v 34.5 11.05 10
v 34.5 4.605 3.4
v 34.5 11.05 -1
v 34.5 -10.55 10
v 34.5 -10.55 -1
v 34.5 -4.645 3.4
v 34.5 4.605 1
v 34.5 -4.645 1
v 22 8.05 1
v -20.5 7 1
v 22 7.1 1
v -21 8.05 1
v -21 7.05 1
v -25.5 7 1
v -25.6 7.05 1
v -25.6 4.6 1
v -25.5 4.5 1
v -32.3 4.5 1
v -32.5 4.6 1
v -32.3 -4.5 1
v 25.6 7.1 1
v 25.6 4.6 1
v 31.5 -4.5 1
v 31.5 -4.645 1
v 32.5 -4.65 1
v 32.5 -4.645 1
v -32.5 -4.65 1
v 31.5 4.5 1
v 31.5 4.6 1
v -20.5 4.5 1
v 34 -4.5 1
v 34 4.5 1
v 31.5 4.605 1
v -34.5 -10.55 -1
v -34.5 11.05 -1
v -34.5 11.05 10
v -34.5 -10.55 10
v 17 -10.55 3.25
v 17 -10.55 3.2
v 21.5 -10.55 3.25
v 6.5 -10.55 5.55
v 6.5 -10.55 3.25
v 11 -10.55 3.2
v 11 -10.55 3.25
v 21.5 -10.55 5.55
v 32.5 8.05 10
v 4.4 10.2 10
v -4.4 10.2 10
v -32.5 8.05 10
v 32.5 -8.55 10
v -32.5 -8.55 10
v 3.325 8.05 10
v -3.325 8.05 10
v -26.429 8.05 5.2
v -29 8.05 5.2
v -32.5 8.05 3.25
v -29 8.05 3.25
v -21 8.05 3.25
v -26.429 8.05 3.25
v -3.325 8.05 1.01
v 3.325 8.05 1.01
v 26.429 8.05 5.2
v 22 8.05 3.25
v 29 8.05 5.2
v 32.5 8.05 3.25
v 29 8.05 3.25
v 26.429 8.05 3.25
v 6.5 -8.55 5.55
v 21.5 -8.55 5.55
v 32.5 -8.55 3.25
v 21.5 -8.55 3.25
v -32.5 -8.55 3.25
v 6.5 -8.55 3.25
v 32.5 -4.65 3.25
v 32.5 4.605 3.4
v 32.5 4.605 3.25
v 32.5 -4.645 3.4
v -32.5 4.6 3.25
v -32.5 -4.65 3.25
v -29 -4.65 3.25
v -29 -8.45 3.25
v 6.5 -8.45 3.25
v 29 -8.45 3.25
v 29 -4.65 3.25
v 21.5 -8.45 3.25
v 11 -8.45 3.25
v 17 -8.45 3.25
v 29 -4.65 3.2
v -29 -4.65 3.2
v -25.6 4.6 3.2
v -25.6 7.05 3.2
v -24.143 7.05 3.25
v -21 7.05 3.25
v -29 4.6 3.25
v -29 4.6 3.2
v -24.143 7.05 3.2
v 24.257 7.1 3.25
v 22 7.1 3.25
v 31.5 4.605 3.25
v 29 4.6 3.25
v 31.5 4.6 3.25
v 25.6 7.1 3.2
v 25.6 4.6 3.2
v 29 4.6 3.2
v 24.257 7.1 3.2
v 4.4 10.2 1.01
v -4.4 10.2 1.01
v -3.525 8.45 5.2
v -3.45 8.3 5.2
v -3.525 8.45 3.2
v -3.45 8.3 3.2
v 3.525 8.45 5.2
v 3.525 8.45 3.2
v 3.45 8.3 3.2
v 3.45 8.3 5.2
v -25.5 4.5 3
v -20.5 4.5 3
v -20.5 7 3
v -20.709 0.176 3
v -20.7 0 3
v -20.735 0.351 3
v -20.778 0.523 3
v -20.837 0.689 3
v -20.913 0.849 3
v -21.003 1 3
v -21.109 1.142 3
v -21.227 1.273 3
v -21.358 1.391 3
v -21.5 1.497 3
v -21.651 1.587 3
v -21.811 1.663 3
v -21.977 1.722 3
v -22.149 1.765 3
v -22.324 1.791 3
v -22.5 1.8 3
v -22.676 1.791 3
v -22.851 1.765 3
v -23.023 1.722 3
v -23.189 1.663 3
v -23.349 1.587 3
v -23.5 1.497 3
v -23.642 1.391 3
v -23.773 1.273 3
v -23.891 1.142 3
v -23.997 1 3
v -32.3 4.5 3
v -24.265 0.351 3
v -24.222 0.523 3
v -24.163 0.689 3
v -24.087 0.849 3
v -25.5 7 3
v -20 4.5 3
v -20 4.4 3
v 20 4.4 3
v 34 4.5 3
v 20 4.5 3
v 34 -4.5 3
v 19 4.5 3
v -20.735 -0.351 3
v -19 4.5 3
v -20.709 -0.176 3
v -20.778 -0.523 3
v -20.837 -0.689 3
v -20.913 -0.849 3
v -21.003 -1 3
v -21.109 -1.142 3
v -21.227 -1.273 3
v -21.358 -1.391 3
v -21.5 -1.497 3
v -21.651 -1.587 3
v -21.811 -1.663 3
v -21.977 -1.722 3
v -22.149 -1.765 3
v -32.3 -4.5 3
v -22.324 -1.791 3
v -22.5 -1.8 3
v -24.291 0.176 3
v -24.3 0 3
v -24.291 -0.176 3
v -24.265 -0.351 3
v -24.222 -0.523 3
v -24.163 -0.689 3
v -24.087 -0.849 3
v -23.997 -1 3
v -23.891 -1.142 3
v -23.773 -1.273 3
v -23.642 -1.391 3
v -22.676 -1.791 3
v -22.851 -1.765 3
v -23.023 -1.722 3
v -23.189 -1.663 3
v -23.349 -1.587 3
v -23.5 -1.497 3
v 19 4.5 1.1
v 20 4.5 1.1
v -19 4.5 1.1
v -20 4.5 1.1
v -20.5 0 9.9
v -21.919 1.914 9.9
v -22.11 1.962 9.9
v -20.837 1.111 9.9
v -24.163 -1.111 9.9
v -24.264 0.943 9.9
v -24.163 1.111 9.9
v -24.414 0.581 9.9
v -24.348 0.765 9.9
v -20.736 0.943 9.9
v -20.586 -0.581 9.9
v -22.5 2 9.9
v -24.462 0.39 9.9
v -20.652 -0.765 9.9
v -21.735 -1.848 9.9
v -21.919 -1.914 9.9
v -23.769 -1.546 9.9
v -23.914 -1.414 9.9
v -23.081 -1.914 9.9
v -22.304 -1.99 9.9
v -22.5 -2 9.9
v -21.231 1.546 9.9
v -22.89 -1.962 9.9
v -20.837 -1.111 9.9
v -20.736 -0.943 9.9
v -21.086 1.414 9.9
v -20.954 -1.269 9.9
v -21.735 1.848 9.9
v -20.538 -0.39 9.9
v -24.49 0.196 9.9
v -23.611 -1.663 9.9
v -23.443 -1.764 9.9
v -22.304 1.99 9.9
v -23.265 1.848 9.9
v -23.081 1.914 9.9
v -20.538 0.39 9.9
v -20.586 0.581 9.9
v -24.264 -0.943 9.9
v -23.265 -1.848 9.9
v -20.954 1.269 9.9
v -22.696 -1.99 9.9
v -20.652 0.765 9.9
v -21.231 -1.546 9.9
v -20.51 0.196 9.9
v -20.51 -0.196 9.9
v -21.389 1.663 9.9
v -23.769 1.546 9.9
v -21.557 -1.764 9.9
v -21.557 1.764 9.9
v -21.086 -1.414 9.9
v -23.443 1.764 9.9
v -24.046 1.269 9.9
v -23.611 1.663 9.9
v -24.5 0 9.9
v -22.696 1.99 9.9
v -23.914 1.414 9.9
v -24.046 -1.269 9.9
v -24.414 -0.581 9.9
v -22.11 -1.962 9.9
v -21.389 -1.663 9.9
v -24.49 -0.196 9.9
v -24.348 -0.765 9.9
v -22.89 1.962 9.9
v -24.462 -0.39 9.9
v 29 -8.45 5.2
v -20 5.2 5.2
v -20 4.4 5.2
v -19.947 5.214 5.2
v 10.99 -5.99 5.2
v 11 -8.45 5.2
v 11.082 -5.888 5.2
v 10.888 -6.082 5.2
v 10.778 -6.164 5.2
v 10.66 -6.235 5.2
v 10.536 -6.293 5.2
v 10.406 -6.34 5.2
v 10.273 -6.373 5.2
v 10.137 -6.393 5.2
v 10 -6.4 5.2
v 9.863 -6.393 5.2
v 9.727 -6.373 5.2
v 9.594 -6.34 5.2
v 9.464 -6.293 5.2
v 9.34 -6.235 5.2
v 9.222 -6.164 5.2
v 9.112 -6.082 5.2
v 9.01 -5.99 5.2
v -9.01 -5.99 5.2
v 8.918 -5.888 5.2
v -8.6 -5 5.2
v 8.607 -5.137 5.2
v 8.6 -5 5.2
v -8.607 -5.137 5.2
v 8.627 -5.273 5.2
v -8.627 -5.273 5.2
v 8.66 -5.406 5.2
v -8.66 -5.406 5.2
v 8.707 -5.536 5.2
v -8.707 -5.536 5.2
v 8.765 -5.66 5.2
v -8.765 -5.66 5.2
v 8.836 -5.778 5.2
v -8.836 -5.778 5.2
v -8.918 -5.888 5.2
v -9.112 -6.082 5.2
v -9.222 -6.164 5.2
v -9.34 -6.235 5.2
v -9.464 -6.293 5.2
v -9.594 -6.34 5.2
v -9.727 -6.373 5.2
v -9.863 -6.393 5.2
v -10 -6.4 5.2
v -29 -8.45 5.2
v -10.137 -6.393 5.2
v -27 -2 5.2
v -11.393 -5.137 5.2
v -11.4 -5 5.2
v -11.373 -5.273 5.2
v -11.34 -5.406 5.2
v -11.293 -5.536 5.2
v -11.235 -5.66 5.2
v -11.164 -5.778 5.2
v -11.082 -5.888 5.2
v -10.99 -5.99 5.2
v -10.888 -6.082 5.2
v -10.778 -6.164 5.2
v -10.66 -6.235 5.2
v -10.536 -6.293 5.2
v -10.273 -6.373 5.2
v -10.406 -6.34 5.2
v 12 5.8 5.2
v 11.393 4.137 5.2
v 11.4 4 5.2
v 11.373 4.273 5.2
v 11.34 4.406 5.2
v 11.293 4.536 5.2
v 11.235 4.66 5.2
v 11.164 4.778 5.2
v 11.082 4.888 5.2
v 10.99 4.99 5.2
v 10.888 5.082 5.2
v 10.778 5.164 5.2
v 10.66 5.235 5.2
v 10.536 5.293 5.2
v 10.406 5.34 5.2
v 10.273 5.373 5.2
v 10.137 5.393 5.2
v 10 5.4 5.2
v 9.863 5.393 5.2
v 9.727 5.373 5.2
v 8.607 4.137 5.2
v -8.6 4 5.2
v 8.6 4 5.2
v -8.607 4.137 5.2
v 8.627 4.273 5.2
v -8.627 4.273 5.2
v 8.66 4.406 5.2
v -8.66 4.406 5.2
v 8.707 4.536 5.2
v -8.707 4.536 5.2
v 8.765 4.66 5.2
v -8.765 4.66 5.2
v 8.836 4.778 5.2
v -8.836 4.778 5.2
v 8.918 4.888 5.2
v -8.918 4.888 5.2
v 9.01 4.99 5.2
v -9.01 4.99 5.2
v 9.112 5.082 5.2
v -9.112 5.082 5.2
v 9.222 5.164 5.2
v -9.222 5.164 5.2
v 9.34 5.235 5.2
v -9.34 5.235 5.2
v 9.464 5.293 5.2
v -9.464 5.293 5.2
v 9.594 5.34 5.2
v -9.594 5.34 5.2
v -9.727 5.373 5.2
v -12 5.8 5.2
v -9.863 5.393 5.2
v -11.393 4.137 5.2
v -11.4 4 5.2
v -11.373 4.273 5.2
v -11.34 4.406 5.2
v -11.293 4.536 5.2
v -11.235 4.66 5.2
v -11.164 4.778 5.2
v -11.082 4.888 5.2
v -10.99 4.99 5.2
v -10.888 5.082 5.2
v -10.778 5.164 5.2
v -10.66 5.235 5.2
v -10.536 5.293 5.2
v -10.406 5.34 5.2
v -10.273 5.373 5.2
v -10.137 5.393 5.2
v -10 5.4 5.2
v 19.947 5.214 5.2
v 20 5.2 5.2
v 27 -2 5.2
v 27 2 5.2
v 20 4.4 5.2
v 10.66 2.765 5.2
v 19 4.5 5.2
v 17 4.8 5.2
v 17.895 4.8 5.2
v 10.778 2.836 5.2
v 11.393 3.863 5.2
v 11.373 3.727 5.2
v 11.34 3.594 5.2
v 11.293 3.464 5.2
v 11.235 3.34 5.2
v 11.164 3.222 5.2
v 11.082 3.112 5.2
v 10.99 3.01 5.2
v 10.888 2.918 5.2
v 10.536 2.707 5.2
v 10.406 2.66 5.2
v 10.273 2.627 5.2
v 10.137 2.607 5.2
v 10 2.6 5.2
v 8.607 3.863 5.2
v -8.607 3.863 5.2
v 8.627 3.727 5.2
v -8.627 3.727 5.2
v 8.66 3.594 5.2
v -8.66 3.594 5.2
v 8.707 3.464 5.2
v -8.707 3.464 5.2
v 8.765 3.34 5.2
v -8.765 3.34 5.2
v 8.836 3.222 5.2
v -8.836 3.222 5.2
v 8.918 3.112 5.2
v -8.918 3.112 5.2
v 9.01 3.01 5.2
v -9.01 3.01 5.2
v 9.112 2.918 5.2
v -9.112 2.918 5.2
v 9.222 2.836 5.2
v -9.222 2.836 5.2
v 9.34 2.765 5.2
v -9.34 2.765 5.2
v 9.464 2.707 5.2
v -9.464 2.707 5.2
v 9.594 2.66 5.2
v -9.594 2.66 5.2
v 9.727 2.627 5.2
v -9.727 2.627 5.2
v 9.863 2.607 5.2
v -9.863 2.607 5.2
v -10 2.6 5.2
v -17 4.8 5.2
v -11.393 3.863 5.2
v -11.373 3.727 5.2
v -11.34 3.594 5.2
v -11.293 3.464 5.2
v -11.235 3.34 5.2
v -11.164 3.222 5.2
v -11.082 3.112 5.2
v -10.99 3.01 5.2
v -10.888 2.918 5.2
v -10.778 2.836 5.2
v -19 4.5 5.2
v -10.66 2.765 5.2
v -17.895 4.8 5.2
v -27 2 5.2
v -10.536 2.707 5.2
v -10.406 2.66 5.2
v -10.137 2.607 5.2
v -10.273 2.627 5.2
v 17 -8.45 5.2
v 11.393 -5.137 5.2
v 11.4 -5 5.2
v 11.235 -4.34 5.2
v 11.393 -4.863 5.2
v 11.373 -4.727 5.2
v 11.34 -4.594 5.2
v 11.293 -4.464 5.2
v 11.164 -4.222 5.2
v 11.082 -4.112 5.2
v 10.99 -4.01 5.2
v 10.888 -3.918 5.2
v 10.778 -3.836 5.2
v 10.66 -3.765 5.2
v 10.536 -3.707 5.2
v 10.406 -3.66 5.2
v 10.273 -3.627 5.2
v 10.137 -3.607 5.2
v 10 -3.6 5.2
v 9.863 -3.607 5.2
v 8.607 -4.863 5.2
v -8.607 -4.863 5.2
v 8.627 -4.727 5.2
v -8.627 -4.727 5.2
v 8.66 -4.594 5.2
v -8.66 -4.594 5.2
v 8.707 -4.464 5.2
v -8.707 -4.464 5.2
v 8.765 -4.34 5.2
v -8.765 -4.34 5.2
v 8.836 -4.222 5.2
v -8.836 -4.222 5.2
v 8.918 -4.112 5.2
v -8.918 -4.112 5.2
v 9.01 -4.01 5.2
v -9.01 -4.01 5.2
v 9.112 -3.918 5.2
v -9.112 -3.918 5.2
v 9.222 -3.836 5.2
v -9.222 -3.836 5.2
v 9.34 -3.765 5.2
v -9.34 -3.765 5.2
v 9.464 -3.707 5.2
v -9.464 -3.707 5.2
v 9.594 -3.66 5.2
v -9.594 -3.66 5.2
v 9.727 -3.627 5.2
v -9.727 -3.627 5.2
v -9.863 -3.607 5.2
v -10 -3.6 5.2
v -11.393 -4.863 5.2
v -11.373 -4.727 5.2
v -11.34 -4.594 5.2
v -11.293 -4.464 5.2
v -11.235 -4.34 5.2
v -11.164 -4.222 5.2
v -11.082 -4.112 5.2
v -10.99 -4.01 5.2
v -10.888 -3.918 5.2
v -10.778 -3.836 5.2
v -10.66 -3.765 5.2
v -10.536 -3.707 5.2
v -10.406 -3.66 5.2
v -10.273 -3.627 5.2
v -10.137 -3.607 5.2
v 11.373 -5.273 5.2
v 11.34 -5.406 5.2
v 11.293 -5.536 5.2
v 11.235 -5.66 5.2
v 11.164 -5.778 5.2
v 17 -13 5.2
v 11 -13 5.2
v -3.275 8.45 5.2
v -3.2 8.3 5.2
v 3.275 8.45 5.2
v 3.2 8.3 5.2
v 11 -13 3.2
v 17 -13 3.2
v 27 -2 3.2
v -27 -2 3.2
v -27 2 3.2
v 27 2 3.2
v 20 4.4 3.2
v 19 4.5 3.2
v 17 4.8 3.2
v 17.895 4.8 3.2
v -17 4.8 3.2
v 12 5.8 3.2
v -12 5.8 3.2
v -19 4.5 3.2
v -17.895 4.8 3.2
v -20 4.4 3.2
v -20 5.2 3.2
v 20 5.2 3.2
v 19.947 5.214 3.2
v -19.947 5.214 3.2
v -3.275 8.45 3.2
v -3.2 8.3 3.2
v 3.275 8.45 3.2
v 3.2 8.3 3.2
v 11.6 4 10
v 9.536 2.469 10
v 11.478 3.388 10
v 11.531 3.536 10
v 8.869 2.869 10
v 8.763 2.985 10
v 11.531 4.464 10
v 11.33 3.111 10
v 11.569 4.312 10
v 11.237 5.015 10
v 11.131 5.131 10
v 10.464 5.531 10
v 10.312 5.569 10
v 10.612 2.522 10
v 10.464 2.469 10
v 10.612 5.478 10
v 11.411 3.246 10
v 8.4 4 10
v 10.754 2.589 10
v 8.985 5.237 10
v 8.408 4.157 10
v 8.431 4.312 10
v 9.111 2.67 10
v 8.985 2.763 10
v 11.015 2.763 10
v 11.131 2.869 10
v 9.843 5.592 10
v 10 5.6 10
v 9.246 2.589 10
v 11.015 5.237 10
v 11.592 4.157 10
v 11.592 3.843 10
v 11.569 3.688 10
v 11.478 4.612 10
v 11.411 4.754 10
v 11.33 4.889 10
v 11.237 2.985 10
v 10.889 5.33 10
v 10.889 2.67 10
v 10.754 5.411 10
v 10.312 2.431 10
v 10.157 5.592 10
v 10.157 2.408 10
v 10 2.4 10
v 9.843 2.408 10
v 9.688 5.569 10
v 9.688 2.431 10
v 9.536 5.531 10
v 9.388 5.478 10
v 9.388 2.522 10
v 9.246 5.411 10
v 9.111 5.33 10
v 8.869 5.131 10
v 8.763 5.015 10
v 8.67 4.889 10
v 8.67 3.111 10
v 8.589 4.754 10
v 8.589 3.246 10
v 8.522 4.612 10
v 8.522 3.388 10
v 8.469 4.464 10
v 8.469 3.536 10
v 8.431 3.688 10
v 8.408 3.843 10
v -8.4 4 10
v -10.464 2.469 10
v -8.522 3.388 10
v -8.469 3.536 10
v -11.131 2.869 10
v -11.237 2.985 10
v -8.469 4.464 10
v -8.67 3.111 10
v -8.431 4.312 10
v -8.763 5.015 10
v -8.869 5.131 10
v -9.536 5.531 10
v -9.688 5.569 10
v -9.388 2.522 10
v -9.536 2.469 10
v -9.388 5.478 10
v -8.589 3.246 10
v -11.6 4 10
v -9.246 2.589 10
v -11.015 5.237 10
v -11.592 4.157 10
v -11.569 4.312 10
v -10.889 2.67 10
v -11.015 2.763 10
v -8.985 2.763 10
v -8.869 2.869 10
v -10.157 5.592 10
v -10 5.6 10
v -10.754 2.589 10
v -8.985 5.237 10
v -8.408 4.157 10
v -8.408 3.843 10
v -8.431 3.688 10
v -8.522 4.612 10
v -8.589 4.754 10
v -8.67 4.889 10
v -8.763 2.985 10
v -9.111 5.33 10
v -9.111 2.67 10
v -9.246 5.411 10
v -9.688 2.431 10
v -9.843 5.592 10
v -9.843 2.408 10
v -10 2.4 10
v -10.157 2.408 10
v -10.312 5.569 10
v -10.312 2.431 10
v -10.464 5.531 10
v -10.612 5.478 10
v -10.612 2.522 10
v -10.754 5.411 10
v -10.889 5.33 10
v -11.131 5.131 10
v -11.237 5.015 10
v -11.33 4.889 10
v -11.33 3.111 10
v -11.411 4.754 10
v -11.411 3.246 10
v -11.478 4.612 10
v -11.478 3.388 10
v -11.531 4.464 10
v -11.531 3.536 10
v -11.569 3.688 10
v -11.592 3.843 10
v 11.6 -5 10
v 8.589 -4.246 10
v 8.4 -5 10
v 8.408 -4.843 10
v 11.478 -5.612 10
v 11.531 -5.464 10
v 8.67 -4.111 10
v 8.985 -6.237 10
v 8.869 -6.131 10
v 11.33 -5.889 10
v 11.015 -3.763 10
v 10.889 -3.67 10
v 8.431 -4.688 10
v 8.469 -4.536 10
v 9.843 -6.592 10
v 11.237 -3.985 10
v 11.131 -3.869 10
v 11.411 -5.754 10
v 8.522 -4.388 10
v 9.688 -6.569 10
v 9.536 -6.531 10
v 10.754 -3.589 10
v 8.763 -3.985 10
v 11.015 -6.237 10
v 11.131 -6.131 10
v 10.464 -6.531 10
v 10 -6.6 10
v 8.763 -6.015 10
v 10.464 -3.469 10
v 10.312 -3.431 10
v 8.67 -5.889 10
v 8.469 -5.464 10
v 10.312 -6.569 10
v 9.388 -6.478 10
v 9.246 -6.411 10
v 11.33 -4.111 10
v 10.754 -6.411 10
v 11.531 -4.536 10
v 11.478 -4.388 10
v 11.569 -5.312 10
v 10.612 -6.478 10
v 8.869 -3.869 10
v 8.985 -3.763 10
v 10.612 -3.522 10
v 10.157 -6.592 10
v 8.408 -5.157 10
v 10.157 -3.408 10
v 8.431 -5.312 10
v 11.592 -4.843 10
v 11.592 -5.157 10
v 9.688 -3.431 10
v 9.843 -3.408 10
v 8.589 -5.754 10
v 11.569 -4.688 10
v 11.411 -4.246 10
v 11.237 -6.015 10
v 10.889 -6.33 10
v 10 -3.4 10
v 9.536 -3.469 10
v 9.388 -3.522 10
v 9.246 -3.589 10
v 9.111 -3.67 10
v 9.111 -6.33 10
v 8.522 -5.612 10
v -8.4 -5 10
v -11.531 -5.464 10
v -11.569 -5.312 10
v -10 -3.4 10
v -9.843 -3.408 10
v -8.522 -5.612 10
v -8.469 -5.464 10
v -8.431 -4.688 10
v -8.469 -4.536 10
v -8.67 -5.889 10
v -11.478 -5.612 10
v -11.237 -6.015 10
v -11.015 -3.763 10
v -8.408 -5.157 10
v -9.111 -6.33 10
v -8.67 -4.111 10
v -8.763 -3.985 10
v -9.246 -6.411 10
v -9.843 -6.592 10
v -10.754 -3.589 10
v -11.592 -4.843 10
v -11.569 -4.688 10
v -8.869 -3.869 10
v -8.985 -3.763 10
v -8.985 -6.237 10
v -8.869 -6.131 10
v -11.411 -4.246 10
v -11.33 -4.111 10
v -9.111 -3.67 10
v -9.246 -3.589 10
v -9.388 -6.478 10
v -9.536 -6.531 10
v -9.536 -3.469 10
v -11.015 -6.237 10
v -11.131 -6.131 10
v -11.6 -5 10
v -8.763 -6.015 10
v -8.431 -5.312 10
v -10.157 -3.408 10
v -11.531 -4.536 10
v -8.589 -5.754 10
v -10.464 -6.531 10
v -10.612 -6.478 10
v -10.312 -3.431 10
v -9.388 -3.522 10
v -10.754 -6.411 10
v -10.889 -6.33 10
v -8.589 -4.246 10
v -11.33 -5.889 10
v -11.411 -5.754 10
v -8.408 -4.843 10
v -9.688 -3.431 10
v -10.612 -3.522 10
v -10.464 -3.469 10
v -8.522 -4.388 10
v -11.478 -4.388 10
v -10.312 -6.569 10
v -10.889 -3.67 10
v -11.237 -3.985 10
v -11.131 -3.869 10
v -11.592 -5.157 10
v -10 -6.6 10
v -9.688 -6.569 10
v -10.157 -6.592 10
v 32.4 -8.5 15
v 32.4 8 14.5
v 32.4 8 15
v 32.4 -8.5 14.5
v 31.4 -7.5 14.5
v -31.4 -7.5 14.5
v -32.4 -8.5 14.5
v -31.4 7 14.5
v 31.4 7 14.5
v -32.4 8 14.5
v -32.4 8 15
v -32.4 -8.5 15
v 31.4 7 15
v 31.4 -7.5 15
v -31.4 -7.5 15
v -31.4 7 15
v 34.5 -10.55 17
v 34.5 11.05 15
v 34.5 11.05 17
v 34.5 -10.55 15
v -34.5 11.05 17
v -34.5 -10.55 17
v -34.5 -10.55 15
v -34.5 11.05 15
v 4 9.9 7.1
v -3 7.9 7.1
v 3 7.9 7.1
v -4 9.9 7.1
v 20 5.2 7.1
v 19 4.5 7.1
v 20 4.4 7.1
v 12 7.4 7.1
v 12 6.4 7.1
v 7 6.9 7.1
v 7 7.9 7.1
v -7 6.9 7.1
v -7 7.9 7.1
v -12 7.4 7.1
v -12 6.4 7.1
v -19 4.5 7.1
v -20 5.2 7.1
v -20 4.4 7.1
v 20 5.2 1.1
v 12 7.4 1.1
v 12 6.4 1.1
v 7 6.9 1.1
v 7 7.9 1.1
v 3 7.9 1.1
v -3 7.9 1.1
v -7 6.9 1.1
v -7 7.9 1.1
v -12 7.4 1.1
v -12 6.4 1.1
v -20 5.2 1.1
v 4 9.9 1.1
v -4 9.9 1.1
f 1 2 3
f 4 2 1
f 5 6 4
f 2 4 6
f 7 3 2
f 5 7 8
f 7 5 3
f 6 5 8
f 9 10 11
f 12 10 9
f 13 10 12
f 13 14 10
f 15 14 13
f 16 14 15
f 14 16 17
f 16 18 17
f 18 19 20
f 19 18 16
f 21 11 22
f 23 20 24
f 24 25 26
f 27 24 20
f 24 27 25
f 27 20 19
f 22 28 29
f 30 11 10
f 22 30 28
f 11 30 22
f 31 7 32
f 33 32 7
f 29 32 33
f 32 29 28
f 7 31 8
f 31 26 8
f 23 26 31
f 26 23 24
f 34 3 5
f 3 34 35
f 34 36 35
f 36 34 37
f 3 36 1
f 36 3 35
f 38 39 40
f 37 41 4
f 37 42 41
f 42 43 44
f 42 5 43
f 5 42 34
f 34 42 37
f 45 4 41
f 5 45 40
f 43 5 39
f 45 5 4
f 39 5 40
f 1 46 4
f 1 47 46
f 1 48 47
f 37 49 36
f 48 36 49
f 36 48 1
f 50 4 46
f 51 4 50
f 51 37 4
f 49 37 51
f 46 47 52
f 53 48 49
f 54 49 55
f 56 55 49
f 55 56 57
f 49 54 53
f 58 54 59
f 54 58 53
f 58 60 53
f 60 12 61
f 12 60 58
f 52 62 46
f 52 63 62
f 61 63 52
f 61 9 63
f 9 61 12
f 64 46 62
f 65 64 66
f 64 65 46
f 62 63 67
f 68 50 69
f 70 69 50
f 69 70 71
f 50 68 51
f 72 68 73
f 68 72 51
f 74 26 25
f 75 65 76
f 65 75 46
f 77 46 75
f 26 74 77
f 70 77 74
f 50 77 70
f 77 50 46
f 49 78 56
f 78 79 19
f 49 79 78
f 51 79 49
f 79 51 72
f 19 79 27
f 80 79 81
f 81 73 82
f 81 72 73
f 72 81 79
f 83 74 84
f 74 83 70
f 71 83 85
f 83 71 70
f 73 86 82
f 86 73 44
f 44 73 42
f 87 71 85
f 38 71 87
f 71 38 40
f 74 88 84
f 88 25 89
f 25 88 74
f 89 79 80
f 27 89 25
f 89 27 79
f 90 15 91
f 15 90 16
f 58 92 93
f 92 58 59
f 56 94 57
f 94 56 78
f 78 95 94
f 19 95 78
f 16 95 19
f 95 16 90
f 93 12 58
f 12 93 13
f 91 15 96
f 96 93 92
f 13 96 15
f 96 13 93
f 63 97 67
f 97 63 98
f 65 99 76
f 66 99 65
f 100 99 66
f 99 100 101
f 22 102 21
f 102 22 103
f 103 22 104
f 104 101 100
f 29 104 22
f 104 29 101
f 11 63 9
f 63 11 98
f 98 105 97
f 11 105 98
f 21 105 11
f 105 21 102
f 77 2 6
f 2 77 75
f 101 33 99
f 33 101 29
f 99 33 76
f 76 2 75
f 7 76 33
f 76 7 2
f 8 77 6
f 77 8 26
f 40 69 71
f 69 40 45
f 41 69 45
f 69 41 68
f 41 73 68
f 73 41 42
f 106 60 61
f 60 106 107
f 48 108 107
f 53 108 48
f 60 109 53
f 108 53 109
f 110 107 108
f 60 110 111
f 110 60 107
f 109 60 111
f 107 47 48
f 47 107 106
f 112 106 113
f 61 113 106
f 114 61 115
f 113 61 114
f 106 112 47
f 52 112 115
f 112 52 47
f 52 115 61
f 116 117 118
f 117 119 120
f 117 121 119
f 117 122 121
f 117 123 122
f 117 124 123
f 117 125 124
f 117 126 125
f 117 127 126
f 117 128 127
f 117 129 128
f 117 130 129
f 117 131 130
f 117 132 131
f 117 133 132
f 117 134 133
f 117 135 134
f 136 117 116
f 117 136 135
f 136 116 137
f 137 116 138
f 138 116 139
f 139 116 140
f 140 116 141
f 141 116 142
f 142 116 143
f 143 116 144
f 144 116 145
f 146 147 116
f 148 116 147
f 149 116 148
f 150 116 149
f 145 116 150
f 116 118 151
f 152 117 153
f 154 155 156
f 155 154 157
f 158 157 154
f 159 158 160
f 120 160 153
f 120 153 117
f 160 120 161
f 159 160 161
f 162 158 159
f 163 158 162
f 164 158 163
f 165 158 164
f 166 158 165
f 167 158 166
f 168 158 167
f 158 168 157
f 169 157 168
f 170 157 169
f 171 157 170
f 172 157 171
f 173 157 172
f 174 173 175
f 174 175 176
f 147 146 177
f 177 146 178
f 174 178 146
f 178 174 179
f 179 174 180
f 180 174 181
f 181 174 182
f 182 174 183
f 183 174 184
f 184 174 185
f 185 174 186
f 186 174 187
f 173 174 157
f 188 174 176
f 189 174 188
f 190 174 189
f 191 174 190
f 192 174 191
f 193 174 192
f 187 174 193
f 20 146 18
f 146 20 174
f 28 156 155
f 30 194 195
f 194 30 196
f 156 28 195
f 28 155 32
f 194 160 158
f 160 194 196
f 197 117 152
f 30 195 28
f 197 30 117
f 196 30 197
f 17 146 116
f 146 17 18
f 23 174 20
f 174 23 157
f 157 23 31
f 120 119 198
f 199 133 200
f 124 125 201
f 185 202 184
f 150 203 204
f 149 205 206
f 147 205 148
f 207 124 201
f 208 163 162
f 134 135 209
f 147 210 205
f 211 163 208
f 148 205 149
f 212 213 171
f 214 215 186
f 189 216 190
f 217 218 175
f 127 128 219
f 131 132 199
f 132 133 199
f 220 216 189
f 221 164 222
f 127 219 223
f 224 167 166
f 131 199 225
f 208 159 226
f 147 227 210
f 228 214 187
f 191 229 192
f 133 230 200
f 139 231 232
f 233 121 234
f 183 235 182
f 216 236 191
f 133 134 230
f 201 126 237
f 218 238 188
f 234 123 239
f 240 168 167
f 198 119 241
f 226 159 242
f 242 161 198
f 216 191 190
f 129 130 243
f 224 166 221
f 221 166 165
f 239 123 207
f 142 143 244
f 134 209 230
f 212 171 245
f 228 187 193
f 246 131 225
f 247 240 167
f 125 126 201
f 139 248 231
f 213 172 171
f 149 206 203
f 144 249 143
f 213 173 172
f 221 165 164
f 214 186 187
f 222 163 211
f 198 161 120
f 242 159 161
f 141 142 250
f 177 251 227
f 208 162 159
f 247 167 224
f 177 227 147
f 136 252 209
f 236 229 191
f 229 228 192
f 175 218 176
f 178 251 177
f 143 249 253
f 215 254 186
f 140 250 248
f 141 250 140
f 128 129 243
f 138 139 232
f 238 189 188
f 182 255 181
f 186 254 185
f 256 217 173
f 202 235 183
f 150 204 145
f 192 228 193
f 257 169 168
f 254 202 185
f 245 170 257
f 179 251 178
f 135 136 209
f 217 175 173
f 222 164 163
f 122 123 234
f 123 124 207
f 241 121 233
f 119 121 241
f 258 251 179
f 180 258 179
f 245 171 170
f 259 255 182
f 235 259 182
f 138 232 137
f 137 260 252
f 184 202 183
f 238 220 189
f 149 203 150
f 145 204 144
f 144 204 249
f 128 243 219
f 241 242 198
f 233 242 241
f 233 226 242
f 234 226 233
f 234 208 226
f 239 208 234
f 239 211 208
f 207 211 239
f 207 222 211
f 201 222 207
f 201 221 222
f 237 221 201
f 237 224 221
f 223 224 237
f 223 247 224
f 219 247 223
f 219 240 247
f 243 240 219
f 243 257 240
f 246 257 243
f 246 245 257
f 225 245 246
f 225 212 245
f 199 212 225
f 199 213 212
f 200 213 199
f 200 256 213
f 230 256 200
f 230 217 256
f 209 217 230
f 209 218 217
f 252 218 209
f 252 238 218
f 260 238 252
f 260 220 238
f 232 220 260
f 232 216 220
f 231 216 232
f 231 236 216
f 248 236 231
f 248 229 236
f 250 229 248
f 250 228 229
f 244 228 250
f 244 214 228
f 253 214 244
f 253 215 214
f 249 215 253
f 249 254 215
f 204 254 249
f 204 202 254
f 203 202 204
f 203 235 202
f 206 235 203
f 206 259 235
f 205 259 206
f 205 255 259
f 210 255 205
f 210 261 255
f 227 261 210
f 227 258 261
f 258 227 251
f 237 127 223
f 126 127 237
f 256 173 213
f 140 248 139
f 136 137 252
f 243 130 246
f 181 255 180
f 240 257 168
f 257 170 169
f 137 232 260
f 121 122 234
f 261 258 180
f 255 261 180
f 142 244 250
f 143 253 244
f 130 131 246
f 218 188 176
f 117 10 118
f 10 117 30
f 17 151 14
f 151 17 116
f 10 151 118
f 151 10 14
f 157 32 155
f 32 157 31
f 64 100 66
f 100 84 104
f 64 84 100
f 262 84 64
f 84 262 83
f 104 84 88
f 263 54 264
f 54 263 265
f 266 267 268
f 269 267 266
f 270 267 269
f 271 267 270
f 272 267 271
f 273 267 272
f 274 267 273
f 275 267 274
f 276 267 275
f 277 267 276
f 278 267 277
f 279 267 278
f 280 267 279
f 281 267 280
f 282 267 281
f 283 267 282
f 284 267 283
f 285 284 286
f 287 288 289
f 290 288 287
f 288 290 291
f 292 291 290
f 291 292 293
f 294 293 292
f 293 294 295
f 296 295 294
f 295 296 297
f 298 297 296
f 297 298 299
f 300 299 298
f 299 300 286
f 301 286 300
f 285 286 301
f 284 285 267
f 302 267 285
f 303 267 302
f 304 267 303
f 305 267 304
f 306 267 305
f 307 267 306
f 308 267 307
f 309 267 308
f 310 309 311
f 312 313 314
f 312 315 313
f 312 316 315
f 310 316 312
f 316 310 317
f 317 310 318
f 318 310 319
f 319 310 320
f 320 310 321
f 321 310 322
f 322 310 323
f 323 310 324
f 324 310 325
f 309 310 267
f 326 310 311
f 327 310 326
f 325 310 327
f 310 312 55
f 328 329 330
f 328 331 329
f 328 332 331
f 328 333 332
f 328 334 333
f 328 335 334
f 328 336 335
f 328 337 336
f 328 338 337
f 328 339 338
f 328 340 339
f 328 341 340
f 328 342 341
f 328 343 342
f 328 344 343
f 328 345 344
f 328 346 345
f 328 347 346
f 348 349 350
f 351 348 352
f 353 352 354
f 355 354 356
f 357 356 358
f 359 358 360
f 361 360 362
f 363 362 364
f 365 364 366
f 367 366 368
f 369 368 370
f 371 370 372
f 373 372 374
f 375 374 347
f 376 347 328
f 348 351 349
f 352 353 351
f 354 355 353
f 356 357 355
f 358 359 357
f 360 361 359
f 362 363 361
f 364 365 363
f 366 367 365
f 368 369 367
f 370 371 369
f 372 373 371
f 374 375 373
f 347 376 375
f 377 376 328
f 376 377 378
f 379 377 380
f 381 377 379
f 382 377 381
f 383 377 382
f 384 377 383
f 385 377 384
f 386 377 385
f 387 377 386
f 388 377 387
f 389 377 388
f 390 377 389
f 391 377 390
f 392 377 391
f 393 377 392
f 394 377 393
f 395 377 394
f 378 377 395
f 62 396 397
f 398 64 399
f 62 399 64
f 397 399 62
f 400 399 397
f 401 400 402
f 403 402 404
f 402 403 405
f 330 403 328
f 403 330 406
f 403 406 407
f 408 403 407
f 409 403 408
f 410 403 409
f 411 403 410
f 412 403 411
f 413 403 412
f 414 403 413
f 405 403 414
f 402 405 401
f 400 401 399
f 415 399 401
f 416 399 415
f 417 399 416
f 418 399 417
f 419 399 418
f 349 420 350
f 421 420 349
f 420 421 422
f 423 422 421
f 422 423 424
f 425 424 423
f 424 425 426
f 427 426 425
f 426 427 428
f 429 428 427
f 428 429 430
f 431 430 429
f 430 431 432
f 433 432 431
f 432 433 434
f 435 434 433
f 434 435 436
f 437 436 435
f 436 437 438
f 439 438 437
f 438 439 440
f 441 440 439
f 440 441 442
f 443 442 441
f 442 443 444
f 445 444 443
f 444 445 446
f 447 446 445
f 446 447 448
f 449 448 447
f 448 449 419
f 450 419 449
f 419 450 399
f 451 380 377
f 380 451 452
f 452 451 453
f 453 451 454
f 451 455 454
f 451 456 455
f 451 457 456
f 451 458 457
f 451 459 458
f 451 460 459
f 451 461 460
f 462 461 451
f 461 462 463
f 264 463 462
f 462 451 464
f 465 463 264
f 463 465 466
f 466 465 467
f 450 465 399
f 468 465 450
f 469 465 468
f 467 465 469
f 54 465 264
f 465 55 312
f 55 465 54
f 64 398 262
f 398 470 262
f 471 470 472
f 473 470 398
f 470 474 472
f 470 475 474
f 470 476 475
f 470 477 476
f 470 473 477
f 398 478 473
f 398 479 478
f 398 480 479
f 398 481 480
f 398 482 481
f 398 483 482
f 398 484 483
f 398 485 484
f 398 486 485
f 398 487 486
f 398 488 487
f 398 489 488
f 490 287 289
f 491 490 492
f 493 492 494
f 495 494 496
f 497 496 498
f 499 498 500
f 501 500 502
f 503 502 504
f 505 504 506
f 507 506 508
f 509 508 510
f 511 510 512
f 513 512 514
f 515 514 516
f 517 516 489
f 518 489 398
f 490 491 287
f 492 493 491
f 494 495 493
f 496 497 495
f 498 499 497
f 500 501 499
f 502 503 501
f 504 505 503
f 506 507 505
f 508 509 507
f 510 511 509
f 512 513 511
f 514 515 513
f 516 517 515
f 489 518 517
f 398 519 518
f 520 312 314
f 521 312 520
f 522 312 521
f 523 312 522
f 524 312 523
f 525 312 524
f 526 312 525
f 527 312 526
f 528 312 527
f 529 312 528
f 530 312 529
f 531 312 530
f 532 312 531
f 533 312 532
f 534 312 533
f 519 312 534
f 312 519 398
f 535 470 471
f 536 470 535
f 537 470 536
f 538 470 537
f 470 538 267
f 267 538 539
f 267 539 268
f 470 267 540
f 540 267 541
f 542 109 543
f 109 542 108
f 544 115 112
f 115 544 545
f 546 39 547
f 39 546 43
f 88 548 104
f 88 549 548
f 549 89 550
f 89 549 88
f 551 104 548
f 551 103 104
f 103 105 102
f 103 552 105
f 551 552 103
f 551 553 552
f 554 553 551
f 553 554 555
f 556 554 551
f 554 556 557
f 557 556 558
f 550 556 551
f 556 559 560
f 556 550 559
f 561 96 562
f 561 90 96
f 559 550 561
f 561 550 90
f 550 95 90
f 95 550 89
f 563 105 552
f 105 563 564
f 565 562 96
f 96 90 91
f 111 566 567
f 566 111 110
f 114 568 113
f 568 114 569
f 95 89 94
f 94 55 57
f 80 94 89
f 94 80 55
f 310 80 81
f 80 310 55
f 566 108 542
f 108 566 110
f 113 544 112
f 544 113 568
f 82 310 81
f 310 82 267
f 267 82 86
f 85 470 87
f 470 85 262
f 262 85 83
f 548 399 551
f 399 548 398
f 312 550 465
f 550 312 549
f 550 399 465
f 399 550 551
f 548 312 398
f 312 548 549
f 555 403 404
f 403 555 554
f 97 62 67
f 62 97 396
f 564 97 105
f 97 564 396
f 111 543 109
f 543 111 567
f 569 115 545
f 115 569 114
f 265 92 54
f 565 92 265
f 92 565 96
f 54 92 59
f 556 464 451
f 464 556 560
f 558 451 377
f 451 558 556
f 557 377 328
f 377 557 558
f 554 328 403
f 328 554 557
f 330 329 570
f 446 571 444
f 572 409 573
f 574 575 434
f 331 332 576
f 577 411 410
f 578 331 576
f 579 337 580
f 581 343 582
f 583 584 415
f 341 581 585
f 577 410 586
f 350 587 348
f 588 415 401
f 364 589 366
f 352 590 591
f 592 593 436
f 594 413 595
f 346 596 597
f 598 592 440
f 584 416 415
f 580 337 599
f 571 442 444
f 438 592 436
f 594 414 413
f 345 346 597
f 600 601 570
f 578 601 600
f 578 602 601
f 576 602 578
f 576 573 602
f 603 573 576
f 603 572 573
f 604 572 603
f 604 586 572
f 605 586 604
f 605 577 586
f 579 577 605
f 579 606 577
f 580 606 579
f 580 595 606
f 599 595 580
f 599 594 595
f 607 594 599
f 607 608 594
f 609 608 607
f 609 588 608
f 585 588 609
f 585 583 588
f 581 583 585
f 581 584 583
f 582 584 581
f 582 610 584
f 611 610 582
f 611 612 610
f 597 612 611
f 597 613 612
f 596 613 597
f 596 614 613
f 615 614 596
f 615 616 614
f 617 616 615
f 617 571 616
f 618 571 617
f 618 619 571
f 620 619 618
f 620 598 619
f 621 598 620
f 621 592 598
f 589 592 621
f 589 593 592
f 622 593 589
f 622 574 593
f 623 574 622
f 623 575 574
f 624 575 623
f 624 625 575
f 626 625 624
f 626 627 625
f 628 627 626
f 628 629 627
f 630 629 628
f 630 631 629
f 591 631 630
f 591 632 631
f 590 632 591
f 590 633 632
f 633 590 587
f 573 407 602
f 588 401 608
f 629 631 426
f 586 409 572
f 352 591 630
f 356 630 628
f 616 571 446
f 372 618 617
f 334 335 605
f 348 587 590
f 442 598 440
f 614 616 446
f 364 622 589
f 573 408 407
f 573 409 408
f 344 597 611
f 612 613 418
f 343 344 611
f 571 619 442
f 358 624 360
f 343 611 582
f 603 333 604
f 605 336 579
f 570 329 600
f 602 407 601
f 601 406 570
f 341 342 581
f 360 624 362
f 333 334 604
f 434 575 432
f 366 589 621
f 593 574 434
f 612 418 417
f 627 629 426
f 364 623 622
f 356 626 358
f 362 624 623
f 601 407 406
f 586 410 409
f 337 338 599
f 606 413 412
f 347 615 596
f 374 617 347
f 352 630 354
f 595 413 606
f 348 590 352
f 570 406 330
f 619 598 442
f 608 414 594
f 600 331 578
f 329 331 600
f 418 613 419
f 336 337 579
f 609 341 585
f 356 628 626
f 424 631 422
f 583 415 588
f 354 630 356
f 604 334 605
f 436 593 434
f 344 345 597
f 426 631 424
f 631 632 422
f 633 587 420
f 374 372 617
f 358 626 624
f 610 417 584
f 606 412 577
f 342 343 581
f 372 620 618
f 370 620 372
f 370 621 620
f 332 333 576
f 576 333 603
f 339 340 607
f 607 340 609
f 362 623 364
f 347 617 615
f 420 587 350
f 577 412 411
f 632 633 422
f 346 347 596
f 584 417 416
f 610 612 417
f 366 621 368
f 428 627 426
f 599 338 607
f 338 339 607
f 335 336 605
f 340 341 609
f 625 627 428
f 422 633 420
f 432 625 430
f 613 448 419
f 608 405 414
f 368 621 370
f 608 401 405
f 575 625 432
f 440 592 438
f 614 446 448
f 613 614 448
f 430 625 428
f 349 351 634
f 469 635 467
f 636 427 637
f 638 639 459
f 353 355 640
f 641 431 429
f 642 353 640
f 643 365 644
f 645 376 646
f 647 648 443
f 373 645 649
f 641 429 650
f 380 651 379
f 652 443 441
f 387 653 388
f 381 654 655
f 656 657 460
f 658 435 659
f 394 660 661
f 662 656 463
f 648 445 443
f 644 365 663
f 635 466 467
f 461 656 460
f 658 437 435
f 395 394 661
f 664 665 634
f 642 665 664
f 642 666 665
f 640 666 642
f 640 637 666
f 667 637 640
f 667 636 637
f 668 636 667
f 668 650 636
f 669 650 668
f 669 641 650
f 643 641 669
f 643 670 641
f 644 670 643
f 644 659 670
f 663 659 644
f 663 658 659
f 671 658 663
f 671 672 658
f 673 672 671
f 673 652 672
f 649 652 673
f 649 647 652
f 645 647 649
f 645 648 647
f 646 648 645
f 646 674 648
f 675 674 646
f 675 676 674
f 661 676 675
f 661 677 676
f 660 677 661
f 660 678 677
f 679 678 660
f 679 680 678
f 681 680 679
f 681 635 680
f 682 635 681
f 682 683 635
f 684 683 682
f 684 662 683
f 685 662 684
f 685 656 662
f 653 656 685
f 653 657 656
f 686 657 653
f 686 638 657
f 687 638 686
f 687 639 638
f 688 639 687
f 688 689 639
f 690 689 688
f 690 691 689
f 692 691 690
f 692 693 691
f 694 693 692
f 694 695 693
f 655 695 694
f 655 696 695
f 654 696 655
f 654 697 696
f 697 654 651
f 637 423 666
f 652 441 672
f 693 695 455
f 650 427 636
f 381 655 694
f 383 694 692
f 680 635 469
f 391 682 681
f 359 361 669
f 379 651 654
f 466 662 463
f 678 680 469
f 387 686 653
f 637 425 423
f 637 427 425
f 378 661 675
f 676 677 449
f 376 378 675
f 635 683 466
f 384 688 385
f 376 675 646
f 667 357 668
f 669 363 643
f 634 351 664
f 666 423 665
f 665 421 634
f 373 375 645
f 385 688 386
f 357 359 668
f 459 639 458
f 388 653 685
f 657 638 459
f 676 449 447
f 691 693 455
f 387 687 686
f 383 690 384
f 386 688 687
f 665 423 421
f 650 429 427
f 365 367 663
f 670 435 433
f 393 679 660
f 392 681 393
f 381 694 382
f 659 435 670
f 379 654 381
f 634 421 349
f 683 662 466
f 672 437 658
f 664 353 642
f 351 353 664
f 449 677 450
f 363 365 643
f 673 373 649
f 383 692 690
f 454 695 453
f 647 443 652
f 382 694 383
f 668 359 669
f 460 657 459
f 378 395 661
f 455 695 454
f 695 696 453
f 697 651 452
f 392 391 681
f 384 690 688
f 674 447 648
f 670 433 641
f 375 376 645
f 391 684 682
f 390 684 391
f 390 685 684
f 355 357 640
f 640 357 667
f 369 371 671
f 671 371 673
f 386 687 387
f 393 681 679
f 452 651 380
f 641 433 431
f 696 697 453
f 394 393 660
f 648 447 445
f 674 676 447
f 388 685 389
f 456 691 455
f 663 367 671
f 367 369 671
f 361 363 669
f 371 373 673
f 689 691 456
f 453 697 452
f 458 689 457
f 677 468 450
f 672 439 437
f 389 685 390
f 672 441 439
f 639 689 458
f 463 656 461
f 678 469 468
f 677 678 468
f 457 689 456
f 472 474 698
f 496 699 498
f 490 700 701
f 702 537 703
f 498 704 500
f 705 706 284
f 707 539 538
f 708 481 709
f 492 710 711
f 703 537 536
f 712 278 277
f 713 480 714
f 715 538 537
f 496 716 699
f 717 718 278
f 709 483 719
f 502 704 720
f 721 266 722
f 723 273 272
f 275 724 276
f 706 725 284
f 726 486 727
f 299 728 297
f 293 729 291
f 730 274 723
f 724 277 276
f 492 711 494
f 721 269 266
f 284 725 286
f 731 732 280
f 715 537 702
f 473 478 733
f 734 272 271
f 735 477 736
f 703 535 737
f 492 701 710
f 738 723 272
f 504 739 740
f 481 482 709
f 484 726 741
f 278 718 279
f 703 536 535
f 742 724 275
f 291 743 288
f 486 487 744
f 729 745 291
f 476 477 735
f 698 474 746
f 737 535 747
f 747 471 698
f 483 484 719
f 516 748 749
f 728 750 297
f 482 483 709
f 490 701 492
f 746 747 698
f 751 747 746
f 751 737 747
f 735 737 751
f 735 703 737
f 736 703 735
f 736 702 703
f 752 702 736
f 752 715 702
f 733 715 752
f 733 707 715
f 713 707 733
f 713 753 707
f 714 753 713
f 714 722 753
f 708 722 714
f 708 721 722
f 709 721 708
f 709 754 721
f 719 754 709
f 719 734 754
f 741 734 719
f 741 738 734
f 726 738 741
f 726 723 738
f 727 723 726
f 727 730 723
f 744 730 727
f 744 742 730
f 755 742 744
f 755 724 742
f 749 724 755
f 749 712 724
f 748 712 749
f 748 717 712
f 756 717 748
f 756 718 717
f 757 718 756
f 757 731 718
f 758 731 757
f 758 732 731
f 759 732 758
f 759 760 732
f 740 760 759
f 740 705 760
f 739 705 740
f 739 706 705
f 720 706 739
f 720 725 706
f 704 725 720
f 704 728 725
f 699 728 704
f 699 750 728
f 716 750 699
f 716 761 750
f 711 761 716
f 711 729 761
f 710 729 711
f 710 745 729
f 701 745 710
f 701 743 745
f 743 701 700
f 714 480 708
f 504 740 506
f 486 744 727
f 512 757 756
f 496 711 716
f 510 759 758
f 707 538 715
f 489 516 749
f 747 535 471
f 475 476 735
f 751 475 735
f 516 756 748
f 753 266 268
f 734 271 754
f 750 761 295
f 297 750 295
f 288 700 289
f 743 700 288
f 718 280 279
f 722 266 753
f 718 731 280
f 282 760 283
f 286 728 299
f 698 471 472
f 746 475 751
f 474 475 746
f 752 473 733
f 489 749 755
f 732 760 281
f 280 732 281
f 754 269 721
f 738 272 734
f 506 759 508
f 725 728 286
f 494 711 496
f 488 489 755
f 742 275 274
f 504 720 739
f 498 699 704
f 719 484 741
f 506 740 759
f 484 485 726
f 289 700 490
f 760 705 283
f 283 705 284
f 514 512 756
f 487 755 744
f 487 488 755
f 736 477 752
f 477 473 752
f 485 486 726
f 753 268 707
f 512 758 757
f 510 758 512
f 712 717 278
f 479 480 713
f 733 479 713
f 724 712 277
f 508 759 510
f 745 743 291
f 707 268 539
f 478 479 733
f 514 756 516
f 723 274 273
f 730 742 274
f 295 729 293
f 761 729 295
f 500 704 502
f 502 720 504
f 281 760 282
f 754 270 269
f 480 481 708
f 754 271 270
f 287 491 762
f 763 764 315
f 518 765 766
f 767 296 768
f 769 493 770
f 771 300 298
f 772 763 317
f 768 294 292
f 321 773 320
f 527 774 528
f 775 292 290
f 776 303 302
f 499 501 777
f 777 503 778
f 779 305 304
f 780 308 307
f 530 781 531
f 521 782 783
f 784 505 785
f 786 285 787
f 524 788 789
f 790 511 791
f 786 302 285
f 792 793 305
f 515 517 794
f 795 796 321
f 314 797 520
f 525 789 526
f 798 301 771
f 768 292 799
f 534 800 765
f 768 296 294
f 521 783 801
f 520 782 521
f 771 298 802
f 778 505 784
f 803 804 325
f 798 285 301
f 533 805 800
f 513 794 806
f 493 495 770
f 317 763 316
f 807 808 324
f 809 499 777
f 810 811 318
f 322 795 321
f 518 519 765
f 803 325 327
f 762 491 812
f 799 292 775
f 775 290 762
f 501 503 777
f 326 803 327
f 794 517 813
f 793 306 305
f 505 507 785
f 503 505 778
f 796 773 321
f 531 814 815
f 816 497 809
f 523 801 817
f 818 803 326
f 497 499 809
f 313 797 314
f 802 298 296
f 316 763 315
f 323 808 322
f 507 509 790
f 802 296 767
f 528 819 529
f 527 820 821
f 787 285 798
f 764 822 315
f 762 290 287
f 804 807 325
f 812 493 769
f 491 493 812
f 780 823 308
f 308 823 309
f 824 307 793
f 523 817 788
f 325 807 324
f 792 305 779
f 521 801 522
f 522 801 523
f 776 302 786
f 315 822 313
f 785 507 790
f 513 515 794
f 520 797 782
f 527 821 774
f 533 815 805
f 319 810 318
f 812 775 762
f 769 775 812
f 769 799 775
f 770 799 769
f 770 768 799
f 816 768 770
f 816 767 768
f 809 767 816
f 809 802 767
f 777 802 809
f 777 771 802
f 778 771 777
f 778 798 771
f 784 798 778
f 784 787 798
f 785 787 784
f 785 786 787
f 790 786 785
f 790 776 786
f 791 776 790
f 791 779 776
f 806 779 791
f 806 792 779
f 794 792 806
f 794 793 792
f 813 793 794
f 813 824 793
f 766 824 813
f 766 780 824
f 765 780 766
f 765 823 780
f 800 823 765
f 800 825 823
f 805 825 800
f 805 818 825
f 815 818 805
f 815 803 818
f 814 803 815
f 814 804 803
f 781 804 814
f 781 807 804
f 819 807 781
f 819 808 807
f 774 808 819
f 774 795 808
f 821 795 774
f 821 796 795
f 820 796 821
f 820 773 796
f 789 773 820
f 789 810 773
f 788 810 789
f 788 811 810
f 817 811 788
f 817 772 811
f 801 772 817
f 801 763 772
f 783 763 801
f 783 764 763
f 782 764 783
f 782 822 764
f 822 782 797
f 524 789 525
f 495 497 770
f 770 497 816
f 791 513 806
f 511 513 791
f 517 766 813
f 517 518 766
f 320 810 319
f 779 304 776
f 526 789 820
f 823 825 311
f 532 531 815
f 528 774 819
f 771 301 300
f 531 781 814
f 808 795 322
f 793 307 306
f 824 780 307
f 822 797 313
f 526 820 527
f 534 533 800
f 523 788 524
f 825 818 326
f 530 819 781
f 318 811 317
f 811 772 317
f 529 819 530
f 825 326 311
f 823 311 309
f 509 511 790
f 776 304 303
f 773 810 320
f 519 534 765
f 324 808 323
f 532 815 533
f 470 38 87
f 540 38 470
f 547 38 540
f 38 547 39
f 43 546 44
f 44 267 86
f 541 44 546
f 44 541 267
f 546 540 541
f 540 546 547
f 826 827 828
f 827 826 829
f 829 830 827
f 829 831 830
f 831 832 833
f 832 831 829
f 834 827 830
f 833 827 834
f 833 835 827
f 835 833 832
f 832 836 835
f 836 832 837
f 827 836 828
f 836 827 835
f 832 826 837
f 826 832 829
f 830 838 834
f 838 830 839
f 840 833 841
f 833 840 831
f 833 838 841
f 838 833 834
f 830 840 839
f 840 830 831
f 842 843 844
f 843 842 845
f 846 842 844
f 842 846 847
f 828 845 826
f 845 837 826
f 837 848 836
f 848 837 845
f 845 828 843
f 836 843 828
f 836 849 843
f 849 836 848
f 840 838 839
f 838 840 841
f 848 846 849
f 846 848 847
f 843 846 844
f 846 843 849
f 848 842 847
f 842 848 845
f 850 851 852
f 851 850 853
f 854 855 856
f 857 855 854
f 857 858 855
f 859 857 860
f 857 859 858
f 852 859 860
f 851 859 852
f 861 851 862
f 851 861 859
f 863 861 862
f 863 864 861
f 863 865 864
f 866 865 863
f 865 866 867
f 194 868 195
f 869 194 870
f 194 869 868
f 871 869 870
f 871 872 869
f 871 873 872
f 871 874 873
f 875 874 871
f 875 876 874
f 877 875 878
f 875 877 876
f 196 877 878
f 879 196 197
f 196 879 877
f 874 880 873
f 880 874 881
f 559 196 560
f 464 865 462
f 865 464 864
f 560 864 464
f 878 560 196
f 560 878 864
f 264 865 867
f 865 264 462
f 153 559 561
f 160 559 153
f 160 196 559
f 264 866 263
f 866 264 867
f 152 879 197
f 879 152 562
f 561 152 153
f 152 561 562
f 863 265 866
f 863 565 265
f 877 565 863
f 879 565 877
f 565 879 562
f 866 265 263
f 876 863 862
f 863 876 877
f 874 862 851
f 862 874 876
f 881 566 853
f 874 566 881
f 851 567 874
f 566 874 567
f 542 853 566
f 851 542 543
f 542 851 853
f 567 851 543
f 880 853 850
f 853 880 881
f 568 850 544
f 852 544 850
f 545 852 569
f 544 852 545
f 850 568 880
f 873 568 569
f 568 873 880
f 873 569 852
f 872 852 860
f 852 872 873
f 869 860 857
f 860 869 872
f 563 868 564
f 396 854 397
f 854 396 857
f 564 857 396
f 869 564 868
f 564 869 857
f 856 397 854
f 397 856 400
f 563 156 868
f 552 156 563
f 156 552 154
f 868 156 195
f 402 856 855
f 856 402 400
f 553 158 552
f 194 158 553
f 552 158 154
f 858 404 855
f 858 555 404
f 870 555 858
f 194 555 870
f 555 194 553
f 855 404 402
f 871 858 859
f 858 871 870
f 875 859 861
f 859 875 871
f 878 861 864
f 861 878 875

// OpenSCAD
$fn=64;

keyLength = 50;
keyWidth = 9;
keyThickness = 2;


wallWidth = 2;
bodyScalerX = 1.3;
bodyScalerY = 1.9;
bodyHeight = 9;

// knob dimensions

// movement dimensions
movementPlay = 10;

module key() {
    cube([keyLength+6,keyWidth,keyThickness],true);
}

module base() {
    difference() {
        union() {
            translate([0,0.25,0])
                cube([bodyScalerX*keyLength+2*wallWidth,bodyScalerY*keyWidth+2*wallWidth+0.5,wallWidth],true);
            translate([0,bodyScalerY*keyWidth/2+wallWidth/2,(bodyHeight+wallWidth)/2])
                cube([bodyScalerX*keyLength+2*wallWidth,wallWidth+1,bodyHeight],true);
            translate([0,-bodyScalerY*keyWidth/2-wallWidth/2,(bodyHeight+wallWidth)/2])
                cube([bodyScalerX*keyLength+2*wallWidth,wallWidth,bodyHeight],true);
            translate([bodyScalerX*keyLength/2+wallWidth/2,0,bodyHeight/2+wallWidth/2])
                cube([wallWidth,bodyScalerY*keyWidth+2*wallWidth,bodyHeight],true);
            translate([-bodyScalerX*keyLength/2-wallWidth/2,0,bodyHeight/2+wallWidth/2])
                cube([wallWidth,bodyScalerY*keyWidth+2*wallWidth,bodyHeight],true);
            translate([0,-bodyScalerY*keyWidth/2-wallWidth/2+2.4,2])
                cube([bodyScalerX*keyLength+2*wallWidth,5,2.5],true);
            translate([-29.6,6.6,2])
                cube([8,4,2.5],true);
            translate([-24,8.05,2])
                cube([6,2,2.5],true);
            translate([29.6,7.1,2])
                cube([8,5,2.5],true);
            translate([24,8.6,2])
                cube([4,3,2.5],true);
            
        }
        translate([34,-0.02,2.20])
                cube([5,9.25,2.4],true);
        translate([14,-10,4.4])
            cube([15,4,2.3],true);
        translate([0,10.2,10.91]) rotate([180,0,0]) scale([1.1,1.1,1.1]) latch(9);
    }
}

module latch(height) {
    outline=[[0,0],[4,0],[3,2],[7,2],[12,2.5],[20,4.7],[20,5.5],[19,5.4],[12,3.5],[7,3],[0,3]];
    linear_extrude(height) union() {
        polygon(outline);
        mirror([1,0,0]) polygon(outline);
    }
}

module keyHolder(insertKey) {
    union() {
        translate([-1,0,0])
            cube([16.6,keyWidth,2],true);
        translate([0.5,0,1])
            cylinder(6.9,1.8,2);
        translate([0,5,0])
            cube([5,4,2],true);
        if(insertKey) {
            translate([keyLength/2+4,0,0]) key();
        }
    }
}

module wedge(height) {
    outline=[[0,1],[12,1],[17,0],[19,0],[27,3.5],[0,3.5]];
    linear_extrude(height) {
        union() {
            polygon(outline);
            mirror([1,0,0]) polygon(outline);
        }
    }
}
module movement() {
    
    union() {
        difference() {
            cube([bodyScalerX*keyLength-7,bodyScalerY*keyWidth-0.2,wallWidth],true);
            cube([bodyScalerX*keyLength-2*wallWidth-7,4,1.1*wallWidth],true);
            translate([0,4.8,-2]) wedge(4);
        }
        translate([10,4,wallWidth/2]) cylinder(4.8,1.4,1.6);
        translate([-10,4,wallWidth/2]) cylinder(4.8,1.4,1.6);
        translate([10,-5,wallWidth/2]) cylinder(4.8,1.4,1.6);
        translate([-10,-5,wallWidth/2]) cylinder(4.8,1.4,1.6);
        translate([14,-10,0]) cube([6,6,wallWidth],true);
    }
}


module lid() {
    union() {
        translate([0,0.25,0]) cube([bodyScalerX*keyLength+2*wallWidth,bodyScalerY*keyWidth+2*wallWidth+0.5,wallWidth],true);
        difference() {
            translate([0,-0.25,-1]) cube([bodyScalerX*keyLength-0.2,bodyScalerY*keyWidth-0.6,1],true);
            translate([0,-0.25,-1]) cube([bodyScalerX*keyLength-0.2-2,bodyScalerY*keyWidth-0.6-2,2],true);
        }
    }
}

module assembly(insertKey,keyOut) {
    translate([0,0,0]) base();    
    translate([0,9.9,7.1]) rotate([180,0,0]) color("blue")latch(6);
    if(keyOut) {
        translate([23,0,wallWidth+0]) keyHolder(insertKey);
    } else {
        translate([-23,0,wallWidth+0]) keyHolder(insertKey);
    }
    translate([0,0,2.1*wallWidth+0]) color("green", alpha=0.8) movement();
    translate([0,0,bodyHeight+wallWidth+5]) color("grey", alpha=0.4) lid();
}


translate([0,0,0]) assembly(true,false);
//translate([0,30,20]) lid();
//wedge(4);
//translate([0,0,1]) base();
//translate([0,0,0]) latch(7);
//translate([0,0,1]) keyHolder(true);
//translate([0,0,1]) movement();
//translate([0,0,1]) lid();
